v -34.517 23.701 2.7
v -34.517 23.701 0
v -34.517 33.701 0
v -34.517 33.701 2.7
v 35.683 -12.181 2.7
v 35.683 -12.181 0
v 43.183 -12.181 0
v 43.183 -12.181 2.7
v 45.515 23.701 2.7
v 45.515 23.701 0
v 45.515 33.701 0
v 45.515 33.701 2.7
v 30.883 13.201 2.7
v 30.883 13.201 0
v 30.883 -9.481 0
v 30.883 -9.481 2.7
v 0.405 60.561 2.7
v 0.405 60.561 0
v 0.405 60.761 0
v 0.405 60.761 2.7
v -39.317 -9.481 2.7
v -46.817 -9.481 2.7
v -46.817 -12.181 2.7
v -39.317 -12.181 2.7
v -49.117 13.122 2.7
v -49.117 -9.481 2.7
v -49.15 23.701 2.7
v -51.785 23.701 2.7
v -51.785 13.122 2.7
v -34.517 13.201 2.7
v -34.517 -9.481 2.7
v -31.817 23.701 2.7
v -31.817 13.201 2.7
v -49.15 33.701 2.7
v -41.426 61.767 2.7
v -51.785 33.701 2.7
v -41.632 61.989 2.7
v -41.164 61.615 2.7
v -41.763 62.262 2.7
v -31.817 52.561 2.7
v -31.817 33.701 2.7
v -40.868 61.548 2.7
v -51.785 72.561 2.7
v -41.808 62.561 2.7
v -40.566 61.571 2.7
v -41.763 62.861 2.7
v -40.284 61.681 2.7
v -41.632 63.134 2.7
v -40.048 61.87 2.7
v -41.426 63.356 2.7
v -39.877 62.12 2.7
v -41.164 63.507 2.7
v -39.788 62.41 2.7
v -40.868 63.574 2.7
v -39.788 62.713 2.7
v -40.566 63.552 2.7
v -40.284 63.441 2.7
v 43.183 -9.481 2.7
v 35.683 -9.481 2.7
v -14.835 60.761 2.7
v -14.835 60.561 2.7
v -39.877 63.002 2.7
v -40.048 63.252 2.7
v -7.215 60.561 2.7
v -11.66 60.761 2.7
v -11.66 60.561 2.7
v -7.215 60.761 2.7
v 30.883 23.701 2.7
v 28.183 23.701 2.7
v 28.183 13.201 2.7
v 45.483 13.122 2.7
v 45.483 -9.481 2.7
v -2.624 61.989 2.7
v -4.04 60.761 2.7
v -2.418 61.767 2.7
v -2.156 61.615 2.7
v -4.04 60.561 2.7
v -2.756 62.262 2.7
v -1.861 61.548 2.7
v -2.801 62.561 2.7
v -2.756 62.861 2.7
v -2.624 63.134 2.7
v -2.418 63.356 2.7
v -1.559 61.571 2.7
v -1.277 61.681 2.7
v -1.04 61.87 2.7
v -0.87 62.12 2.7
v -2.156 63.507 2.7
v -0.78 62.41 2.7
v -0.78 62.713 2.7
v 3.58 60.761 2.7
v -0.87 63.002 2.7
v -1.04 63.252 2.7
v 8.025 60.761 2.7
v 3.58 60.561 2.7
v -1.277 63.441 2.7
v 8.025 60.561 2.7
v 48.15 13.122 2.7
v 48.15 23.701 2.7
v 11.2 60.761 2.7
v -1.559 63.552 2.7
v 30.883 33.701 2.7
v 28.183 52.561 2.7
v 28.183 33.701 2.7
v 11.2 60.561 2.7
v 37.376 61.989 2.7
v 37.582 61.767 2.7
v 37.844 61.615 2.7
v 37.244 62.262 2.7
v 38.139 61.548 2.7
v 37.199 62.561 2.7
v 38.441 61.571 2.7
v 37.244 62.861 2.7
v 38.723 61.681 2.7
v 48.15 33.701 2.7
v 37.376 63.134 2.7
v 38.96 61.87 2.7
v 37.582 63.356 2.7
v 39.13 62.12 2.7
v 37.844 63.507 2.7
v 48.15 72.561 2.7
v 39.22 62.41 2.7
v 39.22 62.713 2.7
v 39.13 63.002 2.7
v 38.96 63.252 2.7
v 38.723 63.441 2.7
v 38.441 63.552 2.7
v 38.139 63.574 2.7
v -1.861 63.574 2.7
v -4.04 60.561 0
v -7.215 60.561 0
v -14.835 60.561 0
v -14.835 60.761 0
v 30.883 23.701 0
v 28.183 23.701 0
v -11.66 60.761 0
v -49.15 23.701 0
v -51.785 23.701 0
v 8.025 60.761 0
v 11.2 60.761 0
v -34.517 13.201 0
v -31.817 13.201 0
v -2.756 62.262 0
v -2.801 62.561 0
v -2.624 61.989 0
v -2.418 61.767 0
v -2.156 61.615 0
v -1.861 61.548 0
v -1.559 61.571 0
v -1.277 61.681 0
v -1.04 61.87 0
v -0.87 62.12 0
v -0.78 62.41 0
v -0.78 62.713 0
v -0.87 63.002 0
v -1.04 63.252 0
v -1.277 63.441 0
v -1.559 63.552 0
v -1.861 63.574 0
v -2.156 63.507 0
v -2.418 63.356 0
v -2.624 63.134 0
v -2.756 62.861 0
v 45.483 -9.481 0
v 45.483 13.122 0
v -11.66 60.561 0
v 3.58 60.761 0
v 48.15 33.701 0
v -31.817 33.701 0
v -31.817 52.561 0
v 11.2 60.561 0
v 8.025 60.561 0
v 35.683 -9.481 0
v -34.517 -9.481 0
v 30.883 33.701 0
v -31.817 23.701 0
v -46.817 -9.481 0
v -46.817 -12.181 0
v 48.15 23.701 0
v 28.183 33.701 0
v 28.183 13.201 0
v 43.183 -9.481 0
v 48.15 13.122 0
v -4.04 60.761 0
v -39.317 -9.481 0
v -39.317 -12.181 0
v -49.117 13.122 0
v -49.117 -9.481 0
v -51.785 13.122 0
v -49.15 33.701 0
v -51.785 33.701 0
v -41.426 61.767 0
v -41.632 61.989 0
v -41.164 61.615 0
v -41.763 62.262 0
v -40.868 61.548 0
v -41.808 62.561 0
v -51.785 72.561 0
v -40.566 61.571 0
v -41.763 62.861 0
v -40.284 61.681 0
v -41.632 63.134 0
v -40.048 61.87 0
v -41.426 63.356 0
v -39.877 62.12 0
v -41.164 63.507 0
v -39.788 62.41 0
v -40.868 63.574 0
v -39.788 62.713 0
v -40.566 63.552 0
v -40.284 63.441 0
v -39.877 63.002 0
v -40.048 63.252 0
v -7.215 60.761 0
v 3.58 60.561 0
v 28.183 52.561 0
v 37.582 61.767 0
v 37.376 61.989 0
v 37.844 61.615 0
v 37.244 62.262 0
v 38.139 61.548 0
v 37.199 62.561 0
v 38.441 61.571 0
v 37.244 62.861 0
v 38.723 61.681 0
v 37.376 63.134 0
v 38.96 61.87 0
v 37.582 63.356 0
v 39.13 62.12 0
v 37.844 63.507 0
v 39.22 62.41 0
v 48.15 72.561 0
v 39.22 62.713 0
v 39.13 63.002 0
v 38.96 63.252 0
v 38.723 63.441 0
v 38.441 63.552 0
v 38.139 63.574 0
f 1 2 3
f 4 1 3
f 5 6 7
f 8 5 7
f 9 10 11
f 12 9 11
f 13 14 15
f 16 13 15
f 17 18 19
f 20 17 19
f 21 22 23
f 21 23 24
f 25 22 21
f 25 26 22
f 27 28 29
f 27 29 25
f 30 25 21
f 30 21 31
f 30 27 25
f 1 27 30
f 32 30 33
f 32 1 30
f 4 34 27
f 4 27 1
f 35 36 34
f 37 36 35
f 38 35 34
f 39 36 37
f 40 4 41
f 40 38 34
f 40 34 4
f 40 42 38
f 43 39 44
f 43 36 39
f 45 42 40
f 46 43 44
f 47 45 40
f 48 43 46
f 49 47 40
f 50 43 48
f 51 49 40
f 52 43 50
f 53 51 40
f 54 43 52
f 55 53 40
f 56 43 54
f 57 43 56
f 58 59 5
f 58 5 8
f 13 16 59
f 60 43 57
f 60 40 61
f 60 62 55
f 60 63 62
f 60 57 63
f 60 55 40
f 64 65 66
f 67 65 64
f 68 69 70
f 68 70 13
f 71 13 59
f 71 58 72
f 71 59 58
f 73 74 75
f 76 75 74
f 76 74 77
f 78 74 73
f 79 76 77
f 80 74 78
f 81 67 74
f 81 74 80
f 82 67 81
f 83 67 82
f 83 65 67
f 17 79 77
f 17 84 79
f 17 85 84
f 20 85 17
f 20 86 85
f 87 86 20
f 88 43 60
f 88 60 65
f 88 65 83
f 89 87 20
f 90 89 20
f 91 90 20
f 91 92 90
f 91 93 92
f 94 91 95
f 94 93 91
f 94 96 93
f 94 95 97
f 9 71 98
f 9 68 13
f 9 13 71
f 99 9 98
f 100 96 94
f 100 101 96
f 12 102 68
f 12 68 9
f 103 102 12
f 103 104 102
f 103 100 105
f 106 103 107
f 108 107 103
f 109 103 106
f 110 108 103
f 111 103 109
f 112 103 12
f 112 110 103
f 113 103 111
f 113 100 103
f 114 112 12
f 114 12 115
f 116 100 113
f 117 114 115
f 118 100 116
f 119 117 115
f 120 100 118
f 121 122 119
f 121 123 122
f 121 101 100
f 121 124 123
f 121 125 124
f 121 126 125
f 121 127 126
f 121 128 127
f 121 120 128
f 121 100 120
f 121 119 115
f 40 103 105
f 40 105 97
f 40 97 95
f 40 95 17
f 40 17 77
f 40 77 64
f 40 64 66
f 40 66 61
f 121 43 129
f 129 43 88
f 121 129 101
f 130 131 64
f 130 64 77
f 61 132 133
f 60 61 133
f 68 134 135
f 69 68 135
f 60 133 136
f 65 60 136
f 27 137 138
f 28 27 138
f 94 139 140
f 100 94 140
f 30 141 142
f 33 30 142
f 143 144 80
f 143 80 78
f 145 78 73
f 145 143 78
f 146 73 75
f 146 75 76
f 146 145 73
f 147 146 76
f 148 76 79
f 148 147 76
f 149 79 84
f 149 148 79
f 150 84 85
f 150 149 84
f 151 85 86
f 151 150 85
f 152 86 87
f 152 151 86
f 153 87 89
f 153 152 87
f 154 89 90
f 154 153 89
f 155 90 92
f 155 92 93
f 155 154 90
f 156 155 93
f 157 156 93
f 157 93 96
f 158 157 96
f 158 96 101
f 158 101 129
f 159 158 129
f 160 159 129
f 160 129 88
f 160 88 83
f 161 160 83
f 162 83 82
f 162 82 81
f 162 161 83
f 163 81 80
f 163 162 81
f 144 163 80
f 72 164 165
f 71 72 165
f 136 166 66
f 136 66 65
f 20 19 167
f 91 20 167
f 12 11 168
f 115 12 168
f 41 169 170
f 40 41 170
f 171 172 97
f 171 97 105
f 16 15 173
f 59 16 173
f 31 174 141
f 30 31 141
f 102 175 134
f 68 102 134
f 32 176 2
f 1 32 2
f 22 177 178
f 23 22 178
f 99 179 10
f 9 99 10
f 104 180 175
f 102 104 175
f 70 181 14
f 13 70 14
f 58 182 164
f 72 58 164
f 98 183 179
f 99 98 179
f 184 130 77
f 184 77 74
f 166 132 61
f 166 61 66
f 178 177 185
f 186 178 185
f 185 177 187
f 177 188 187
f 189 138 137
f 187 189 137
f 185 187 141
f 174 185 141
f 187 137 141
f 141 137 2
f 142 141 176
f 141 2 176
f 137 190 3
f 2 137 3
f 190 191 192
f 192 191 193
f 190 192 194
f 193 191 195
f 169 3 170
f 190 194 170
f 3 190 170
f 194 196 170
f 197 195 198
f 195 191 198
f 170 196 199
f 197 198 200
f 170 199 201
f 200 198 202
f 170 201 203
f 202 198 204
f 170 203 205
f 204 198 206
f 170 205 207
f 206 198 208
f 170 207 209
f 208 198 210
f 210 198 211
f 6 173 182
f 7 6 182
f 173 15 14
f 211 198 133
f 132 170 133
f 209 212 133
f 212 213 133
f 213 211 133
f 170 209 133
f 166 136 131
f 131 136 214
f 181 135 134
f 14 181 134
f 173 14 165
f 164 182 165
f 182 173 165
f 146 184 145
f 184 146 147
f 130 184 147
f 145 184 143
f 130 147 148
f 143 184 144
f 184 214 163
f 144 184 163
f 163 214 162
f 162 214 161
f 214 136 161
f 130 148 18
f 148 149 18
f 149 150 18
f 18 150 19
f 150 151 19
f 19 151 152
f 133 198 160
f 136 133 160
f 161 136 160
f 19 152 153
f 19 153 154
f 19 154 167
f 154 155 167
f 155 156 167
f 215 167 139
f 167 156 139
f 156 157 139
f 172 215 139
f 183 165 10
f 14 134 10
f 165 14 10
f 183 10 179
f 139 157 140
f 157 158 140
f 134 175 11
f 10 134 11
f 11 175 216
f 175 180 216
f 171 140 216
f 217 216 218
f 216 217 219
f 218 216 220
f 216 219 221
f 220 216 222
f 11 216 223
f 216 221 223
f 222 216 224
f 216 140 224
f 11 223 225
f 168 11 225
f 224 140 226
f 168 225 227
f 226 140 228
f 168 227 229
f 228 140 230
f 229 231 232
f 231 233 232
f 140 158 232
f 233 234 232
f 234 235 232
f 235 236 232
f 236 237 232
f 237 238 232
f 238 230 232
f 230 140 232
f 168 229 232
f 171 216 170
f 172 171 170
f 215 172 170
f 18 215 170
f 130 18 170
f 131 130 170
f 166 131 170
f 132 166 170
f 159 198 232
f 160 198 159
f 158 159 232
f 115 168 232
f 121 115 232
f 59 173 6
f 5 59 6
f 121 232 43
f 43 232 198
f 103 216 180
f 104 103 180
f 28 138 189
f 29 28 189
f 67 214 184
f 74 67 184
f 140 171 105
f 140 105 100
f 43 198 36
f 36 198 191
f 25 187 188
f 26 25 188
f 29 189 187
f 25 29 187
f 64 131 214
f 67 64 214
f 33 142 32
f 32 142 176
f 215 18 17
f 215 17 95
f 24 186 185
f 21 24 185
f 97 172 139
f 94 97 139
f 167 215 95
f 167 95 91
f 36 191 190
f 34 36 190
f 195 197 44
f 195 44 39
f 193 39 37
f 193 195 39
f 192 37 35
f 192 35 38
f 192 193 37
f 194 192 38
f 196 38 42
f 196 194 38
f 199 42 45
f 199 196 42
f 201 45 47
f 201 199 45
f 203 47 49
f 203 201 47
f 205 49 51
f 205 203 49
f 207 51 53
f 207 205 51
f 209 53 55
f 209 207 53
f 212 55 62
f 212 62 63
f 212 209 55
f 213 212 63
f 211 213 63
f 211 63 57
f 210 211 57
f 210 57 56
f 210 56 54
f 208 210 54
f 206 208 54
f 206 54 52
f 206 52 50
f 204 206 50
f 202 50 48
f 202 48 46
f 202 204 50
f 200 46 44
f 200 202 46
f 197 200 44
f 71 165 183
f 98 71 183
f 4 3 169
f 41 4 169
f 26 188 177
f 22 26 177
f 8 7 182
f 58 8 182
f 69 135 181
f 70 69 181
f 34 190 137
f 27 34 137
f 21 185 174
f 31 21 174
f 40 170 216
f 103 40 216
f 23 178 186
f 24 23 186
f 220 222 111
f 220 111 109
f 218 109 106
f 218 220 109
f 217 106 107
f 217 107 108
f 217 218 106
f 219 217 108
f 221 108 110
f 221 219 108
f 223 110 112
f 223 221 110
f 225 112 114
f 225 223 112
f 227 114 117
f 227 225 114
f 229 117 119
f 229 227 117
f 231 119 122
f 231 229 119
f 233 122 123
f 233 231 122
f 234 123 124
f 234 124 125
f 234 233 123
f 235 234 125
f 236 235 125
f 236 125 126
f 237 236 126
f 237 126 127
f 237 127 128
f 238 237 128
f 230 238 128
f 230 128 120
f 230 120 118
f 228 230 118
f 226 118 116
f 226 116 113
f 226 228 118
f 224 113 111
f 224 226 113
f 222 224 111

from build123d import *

# Parameters (mm, degrees)
SKETCH1_R  = 1.016
SKETCH1_W  = 3.175
SKETCH1_H  = 0.2
BASE_DEPTH = 2.7


with BuildPart() as part:
    # Sketch1 → Base (new body)
    with BuildSketch(Plane.XY):
        Polygon((-34.517386137, -9.480737498), (-34.517386137, 13.201100992), (-31.817386137, 13.201100992), (-31.817386137, 23.701100992), (-34.517386137, 23.701100992), (-34.517386137, 33.701100992), (-31.817386137, 33.701100992), (-31.817386137, 52.561262502), (28.182613863, 52.561262502), (28.182613863, 33.701100992), (30.882613863, 33.701100992), (30.882613863, 23.701100992), (28.182613863, 23.701100992), (28.182613863, 13.201100992), (30.882613863, 13.201100992), (30.882613863, -9.480737498), (35.682613863, -9.480737498), (35.682613863, -12.180737498), (43.182613863, -12.180737498), (43.182613863, -9.480737498), (45.482613863, -9.480737498), (45.482613863, 13.121905033), (48.150227726, 13.121905033), (48.150227726, 23.701100992), (45.515, 23.701100992), (45.515, 33.701100992), (48.150227726, 33.701100992), (48.150227726, 72.561262502), (-51.785, 72.561262502), (-51.785, 33.701100992), (-49.149772274, 33.701100992), (-49.149772274, 23.701100992), (-51.785, 23.701100992), (-51.785, 13.121905033), (-49.117386137, 13.121905033), (-49.117386137, -9.480737498), (-46.817386137, -9.480737498), (-46.817386137, -12.180737498), (-39.317386137, -12.180737498), (-39.317386137, -9.480737498), align=None)
        with Locations(Location((-40.7925, 62.561262502, 0), (0, 0, 180))):
            Circle(SKETCH1_R, mode=Mode.SUBTRACT)
        with Locations(Location((38.215, 62.561262502, 0), (0, 0, 180))):
            Circle(SKETCH1_R, mode=Mode.SUBTRACT)
        with Locations(Location((-1.785, 62.561262502, 0), (0, 0, 180))):
            Circle(SKETCH1_R, mode=Mode.SUBTRACT)
        with Locations((-13.247386137, 60.661262502)):
            Rectangle(SKETCH1_W, SKETCH1_H, mode=Mode.SUBTRACT)
        with Locations((-5.627386137, 60.661262502)):
            Rectangle(SKETCH1_W, SKETCH1_H, mode=Mode.SUBTRACT)
        with Locations((1.992613863, 60.661262502)):
            Rectangle(SKETCH1_W, SKETCH1_H, mode=Mode.SUBTRACT)
        with Locations((9.612613863, 60.661262502)):
            Rectangle(SKETCH1_W, SKETCH1_H, mode=Mode.SUBTRACT)
    extrude(amount=BASE_DEPTH)


solid = part.part
